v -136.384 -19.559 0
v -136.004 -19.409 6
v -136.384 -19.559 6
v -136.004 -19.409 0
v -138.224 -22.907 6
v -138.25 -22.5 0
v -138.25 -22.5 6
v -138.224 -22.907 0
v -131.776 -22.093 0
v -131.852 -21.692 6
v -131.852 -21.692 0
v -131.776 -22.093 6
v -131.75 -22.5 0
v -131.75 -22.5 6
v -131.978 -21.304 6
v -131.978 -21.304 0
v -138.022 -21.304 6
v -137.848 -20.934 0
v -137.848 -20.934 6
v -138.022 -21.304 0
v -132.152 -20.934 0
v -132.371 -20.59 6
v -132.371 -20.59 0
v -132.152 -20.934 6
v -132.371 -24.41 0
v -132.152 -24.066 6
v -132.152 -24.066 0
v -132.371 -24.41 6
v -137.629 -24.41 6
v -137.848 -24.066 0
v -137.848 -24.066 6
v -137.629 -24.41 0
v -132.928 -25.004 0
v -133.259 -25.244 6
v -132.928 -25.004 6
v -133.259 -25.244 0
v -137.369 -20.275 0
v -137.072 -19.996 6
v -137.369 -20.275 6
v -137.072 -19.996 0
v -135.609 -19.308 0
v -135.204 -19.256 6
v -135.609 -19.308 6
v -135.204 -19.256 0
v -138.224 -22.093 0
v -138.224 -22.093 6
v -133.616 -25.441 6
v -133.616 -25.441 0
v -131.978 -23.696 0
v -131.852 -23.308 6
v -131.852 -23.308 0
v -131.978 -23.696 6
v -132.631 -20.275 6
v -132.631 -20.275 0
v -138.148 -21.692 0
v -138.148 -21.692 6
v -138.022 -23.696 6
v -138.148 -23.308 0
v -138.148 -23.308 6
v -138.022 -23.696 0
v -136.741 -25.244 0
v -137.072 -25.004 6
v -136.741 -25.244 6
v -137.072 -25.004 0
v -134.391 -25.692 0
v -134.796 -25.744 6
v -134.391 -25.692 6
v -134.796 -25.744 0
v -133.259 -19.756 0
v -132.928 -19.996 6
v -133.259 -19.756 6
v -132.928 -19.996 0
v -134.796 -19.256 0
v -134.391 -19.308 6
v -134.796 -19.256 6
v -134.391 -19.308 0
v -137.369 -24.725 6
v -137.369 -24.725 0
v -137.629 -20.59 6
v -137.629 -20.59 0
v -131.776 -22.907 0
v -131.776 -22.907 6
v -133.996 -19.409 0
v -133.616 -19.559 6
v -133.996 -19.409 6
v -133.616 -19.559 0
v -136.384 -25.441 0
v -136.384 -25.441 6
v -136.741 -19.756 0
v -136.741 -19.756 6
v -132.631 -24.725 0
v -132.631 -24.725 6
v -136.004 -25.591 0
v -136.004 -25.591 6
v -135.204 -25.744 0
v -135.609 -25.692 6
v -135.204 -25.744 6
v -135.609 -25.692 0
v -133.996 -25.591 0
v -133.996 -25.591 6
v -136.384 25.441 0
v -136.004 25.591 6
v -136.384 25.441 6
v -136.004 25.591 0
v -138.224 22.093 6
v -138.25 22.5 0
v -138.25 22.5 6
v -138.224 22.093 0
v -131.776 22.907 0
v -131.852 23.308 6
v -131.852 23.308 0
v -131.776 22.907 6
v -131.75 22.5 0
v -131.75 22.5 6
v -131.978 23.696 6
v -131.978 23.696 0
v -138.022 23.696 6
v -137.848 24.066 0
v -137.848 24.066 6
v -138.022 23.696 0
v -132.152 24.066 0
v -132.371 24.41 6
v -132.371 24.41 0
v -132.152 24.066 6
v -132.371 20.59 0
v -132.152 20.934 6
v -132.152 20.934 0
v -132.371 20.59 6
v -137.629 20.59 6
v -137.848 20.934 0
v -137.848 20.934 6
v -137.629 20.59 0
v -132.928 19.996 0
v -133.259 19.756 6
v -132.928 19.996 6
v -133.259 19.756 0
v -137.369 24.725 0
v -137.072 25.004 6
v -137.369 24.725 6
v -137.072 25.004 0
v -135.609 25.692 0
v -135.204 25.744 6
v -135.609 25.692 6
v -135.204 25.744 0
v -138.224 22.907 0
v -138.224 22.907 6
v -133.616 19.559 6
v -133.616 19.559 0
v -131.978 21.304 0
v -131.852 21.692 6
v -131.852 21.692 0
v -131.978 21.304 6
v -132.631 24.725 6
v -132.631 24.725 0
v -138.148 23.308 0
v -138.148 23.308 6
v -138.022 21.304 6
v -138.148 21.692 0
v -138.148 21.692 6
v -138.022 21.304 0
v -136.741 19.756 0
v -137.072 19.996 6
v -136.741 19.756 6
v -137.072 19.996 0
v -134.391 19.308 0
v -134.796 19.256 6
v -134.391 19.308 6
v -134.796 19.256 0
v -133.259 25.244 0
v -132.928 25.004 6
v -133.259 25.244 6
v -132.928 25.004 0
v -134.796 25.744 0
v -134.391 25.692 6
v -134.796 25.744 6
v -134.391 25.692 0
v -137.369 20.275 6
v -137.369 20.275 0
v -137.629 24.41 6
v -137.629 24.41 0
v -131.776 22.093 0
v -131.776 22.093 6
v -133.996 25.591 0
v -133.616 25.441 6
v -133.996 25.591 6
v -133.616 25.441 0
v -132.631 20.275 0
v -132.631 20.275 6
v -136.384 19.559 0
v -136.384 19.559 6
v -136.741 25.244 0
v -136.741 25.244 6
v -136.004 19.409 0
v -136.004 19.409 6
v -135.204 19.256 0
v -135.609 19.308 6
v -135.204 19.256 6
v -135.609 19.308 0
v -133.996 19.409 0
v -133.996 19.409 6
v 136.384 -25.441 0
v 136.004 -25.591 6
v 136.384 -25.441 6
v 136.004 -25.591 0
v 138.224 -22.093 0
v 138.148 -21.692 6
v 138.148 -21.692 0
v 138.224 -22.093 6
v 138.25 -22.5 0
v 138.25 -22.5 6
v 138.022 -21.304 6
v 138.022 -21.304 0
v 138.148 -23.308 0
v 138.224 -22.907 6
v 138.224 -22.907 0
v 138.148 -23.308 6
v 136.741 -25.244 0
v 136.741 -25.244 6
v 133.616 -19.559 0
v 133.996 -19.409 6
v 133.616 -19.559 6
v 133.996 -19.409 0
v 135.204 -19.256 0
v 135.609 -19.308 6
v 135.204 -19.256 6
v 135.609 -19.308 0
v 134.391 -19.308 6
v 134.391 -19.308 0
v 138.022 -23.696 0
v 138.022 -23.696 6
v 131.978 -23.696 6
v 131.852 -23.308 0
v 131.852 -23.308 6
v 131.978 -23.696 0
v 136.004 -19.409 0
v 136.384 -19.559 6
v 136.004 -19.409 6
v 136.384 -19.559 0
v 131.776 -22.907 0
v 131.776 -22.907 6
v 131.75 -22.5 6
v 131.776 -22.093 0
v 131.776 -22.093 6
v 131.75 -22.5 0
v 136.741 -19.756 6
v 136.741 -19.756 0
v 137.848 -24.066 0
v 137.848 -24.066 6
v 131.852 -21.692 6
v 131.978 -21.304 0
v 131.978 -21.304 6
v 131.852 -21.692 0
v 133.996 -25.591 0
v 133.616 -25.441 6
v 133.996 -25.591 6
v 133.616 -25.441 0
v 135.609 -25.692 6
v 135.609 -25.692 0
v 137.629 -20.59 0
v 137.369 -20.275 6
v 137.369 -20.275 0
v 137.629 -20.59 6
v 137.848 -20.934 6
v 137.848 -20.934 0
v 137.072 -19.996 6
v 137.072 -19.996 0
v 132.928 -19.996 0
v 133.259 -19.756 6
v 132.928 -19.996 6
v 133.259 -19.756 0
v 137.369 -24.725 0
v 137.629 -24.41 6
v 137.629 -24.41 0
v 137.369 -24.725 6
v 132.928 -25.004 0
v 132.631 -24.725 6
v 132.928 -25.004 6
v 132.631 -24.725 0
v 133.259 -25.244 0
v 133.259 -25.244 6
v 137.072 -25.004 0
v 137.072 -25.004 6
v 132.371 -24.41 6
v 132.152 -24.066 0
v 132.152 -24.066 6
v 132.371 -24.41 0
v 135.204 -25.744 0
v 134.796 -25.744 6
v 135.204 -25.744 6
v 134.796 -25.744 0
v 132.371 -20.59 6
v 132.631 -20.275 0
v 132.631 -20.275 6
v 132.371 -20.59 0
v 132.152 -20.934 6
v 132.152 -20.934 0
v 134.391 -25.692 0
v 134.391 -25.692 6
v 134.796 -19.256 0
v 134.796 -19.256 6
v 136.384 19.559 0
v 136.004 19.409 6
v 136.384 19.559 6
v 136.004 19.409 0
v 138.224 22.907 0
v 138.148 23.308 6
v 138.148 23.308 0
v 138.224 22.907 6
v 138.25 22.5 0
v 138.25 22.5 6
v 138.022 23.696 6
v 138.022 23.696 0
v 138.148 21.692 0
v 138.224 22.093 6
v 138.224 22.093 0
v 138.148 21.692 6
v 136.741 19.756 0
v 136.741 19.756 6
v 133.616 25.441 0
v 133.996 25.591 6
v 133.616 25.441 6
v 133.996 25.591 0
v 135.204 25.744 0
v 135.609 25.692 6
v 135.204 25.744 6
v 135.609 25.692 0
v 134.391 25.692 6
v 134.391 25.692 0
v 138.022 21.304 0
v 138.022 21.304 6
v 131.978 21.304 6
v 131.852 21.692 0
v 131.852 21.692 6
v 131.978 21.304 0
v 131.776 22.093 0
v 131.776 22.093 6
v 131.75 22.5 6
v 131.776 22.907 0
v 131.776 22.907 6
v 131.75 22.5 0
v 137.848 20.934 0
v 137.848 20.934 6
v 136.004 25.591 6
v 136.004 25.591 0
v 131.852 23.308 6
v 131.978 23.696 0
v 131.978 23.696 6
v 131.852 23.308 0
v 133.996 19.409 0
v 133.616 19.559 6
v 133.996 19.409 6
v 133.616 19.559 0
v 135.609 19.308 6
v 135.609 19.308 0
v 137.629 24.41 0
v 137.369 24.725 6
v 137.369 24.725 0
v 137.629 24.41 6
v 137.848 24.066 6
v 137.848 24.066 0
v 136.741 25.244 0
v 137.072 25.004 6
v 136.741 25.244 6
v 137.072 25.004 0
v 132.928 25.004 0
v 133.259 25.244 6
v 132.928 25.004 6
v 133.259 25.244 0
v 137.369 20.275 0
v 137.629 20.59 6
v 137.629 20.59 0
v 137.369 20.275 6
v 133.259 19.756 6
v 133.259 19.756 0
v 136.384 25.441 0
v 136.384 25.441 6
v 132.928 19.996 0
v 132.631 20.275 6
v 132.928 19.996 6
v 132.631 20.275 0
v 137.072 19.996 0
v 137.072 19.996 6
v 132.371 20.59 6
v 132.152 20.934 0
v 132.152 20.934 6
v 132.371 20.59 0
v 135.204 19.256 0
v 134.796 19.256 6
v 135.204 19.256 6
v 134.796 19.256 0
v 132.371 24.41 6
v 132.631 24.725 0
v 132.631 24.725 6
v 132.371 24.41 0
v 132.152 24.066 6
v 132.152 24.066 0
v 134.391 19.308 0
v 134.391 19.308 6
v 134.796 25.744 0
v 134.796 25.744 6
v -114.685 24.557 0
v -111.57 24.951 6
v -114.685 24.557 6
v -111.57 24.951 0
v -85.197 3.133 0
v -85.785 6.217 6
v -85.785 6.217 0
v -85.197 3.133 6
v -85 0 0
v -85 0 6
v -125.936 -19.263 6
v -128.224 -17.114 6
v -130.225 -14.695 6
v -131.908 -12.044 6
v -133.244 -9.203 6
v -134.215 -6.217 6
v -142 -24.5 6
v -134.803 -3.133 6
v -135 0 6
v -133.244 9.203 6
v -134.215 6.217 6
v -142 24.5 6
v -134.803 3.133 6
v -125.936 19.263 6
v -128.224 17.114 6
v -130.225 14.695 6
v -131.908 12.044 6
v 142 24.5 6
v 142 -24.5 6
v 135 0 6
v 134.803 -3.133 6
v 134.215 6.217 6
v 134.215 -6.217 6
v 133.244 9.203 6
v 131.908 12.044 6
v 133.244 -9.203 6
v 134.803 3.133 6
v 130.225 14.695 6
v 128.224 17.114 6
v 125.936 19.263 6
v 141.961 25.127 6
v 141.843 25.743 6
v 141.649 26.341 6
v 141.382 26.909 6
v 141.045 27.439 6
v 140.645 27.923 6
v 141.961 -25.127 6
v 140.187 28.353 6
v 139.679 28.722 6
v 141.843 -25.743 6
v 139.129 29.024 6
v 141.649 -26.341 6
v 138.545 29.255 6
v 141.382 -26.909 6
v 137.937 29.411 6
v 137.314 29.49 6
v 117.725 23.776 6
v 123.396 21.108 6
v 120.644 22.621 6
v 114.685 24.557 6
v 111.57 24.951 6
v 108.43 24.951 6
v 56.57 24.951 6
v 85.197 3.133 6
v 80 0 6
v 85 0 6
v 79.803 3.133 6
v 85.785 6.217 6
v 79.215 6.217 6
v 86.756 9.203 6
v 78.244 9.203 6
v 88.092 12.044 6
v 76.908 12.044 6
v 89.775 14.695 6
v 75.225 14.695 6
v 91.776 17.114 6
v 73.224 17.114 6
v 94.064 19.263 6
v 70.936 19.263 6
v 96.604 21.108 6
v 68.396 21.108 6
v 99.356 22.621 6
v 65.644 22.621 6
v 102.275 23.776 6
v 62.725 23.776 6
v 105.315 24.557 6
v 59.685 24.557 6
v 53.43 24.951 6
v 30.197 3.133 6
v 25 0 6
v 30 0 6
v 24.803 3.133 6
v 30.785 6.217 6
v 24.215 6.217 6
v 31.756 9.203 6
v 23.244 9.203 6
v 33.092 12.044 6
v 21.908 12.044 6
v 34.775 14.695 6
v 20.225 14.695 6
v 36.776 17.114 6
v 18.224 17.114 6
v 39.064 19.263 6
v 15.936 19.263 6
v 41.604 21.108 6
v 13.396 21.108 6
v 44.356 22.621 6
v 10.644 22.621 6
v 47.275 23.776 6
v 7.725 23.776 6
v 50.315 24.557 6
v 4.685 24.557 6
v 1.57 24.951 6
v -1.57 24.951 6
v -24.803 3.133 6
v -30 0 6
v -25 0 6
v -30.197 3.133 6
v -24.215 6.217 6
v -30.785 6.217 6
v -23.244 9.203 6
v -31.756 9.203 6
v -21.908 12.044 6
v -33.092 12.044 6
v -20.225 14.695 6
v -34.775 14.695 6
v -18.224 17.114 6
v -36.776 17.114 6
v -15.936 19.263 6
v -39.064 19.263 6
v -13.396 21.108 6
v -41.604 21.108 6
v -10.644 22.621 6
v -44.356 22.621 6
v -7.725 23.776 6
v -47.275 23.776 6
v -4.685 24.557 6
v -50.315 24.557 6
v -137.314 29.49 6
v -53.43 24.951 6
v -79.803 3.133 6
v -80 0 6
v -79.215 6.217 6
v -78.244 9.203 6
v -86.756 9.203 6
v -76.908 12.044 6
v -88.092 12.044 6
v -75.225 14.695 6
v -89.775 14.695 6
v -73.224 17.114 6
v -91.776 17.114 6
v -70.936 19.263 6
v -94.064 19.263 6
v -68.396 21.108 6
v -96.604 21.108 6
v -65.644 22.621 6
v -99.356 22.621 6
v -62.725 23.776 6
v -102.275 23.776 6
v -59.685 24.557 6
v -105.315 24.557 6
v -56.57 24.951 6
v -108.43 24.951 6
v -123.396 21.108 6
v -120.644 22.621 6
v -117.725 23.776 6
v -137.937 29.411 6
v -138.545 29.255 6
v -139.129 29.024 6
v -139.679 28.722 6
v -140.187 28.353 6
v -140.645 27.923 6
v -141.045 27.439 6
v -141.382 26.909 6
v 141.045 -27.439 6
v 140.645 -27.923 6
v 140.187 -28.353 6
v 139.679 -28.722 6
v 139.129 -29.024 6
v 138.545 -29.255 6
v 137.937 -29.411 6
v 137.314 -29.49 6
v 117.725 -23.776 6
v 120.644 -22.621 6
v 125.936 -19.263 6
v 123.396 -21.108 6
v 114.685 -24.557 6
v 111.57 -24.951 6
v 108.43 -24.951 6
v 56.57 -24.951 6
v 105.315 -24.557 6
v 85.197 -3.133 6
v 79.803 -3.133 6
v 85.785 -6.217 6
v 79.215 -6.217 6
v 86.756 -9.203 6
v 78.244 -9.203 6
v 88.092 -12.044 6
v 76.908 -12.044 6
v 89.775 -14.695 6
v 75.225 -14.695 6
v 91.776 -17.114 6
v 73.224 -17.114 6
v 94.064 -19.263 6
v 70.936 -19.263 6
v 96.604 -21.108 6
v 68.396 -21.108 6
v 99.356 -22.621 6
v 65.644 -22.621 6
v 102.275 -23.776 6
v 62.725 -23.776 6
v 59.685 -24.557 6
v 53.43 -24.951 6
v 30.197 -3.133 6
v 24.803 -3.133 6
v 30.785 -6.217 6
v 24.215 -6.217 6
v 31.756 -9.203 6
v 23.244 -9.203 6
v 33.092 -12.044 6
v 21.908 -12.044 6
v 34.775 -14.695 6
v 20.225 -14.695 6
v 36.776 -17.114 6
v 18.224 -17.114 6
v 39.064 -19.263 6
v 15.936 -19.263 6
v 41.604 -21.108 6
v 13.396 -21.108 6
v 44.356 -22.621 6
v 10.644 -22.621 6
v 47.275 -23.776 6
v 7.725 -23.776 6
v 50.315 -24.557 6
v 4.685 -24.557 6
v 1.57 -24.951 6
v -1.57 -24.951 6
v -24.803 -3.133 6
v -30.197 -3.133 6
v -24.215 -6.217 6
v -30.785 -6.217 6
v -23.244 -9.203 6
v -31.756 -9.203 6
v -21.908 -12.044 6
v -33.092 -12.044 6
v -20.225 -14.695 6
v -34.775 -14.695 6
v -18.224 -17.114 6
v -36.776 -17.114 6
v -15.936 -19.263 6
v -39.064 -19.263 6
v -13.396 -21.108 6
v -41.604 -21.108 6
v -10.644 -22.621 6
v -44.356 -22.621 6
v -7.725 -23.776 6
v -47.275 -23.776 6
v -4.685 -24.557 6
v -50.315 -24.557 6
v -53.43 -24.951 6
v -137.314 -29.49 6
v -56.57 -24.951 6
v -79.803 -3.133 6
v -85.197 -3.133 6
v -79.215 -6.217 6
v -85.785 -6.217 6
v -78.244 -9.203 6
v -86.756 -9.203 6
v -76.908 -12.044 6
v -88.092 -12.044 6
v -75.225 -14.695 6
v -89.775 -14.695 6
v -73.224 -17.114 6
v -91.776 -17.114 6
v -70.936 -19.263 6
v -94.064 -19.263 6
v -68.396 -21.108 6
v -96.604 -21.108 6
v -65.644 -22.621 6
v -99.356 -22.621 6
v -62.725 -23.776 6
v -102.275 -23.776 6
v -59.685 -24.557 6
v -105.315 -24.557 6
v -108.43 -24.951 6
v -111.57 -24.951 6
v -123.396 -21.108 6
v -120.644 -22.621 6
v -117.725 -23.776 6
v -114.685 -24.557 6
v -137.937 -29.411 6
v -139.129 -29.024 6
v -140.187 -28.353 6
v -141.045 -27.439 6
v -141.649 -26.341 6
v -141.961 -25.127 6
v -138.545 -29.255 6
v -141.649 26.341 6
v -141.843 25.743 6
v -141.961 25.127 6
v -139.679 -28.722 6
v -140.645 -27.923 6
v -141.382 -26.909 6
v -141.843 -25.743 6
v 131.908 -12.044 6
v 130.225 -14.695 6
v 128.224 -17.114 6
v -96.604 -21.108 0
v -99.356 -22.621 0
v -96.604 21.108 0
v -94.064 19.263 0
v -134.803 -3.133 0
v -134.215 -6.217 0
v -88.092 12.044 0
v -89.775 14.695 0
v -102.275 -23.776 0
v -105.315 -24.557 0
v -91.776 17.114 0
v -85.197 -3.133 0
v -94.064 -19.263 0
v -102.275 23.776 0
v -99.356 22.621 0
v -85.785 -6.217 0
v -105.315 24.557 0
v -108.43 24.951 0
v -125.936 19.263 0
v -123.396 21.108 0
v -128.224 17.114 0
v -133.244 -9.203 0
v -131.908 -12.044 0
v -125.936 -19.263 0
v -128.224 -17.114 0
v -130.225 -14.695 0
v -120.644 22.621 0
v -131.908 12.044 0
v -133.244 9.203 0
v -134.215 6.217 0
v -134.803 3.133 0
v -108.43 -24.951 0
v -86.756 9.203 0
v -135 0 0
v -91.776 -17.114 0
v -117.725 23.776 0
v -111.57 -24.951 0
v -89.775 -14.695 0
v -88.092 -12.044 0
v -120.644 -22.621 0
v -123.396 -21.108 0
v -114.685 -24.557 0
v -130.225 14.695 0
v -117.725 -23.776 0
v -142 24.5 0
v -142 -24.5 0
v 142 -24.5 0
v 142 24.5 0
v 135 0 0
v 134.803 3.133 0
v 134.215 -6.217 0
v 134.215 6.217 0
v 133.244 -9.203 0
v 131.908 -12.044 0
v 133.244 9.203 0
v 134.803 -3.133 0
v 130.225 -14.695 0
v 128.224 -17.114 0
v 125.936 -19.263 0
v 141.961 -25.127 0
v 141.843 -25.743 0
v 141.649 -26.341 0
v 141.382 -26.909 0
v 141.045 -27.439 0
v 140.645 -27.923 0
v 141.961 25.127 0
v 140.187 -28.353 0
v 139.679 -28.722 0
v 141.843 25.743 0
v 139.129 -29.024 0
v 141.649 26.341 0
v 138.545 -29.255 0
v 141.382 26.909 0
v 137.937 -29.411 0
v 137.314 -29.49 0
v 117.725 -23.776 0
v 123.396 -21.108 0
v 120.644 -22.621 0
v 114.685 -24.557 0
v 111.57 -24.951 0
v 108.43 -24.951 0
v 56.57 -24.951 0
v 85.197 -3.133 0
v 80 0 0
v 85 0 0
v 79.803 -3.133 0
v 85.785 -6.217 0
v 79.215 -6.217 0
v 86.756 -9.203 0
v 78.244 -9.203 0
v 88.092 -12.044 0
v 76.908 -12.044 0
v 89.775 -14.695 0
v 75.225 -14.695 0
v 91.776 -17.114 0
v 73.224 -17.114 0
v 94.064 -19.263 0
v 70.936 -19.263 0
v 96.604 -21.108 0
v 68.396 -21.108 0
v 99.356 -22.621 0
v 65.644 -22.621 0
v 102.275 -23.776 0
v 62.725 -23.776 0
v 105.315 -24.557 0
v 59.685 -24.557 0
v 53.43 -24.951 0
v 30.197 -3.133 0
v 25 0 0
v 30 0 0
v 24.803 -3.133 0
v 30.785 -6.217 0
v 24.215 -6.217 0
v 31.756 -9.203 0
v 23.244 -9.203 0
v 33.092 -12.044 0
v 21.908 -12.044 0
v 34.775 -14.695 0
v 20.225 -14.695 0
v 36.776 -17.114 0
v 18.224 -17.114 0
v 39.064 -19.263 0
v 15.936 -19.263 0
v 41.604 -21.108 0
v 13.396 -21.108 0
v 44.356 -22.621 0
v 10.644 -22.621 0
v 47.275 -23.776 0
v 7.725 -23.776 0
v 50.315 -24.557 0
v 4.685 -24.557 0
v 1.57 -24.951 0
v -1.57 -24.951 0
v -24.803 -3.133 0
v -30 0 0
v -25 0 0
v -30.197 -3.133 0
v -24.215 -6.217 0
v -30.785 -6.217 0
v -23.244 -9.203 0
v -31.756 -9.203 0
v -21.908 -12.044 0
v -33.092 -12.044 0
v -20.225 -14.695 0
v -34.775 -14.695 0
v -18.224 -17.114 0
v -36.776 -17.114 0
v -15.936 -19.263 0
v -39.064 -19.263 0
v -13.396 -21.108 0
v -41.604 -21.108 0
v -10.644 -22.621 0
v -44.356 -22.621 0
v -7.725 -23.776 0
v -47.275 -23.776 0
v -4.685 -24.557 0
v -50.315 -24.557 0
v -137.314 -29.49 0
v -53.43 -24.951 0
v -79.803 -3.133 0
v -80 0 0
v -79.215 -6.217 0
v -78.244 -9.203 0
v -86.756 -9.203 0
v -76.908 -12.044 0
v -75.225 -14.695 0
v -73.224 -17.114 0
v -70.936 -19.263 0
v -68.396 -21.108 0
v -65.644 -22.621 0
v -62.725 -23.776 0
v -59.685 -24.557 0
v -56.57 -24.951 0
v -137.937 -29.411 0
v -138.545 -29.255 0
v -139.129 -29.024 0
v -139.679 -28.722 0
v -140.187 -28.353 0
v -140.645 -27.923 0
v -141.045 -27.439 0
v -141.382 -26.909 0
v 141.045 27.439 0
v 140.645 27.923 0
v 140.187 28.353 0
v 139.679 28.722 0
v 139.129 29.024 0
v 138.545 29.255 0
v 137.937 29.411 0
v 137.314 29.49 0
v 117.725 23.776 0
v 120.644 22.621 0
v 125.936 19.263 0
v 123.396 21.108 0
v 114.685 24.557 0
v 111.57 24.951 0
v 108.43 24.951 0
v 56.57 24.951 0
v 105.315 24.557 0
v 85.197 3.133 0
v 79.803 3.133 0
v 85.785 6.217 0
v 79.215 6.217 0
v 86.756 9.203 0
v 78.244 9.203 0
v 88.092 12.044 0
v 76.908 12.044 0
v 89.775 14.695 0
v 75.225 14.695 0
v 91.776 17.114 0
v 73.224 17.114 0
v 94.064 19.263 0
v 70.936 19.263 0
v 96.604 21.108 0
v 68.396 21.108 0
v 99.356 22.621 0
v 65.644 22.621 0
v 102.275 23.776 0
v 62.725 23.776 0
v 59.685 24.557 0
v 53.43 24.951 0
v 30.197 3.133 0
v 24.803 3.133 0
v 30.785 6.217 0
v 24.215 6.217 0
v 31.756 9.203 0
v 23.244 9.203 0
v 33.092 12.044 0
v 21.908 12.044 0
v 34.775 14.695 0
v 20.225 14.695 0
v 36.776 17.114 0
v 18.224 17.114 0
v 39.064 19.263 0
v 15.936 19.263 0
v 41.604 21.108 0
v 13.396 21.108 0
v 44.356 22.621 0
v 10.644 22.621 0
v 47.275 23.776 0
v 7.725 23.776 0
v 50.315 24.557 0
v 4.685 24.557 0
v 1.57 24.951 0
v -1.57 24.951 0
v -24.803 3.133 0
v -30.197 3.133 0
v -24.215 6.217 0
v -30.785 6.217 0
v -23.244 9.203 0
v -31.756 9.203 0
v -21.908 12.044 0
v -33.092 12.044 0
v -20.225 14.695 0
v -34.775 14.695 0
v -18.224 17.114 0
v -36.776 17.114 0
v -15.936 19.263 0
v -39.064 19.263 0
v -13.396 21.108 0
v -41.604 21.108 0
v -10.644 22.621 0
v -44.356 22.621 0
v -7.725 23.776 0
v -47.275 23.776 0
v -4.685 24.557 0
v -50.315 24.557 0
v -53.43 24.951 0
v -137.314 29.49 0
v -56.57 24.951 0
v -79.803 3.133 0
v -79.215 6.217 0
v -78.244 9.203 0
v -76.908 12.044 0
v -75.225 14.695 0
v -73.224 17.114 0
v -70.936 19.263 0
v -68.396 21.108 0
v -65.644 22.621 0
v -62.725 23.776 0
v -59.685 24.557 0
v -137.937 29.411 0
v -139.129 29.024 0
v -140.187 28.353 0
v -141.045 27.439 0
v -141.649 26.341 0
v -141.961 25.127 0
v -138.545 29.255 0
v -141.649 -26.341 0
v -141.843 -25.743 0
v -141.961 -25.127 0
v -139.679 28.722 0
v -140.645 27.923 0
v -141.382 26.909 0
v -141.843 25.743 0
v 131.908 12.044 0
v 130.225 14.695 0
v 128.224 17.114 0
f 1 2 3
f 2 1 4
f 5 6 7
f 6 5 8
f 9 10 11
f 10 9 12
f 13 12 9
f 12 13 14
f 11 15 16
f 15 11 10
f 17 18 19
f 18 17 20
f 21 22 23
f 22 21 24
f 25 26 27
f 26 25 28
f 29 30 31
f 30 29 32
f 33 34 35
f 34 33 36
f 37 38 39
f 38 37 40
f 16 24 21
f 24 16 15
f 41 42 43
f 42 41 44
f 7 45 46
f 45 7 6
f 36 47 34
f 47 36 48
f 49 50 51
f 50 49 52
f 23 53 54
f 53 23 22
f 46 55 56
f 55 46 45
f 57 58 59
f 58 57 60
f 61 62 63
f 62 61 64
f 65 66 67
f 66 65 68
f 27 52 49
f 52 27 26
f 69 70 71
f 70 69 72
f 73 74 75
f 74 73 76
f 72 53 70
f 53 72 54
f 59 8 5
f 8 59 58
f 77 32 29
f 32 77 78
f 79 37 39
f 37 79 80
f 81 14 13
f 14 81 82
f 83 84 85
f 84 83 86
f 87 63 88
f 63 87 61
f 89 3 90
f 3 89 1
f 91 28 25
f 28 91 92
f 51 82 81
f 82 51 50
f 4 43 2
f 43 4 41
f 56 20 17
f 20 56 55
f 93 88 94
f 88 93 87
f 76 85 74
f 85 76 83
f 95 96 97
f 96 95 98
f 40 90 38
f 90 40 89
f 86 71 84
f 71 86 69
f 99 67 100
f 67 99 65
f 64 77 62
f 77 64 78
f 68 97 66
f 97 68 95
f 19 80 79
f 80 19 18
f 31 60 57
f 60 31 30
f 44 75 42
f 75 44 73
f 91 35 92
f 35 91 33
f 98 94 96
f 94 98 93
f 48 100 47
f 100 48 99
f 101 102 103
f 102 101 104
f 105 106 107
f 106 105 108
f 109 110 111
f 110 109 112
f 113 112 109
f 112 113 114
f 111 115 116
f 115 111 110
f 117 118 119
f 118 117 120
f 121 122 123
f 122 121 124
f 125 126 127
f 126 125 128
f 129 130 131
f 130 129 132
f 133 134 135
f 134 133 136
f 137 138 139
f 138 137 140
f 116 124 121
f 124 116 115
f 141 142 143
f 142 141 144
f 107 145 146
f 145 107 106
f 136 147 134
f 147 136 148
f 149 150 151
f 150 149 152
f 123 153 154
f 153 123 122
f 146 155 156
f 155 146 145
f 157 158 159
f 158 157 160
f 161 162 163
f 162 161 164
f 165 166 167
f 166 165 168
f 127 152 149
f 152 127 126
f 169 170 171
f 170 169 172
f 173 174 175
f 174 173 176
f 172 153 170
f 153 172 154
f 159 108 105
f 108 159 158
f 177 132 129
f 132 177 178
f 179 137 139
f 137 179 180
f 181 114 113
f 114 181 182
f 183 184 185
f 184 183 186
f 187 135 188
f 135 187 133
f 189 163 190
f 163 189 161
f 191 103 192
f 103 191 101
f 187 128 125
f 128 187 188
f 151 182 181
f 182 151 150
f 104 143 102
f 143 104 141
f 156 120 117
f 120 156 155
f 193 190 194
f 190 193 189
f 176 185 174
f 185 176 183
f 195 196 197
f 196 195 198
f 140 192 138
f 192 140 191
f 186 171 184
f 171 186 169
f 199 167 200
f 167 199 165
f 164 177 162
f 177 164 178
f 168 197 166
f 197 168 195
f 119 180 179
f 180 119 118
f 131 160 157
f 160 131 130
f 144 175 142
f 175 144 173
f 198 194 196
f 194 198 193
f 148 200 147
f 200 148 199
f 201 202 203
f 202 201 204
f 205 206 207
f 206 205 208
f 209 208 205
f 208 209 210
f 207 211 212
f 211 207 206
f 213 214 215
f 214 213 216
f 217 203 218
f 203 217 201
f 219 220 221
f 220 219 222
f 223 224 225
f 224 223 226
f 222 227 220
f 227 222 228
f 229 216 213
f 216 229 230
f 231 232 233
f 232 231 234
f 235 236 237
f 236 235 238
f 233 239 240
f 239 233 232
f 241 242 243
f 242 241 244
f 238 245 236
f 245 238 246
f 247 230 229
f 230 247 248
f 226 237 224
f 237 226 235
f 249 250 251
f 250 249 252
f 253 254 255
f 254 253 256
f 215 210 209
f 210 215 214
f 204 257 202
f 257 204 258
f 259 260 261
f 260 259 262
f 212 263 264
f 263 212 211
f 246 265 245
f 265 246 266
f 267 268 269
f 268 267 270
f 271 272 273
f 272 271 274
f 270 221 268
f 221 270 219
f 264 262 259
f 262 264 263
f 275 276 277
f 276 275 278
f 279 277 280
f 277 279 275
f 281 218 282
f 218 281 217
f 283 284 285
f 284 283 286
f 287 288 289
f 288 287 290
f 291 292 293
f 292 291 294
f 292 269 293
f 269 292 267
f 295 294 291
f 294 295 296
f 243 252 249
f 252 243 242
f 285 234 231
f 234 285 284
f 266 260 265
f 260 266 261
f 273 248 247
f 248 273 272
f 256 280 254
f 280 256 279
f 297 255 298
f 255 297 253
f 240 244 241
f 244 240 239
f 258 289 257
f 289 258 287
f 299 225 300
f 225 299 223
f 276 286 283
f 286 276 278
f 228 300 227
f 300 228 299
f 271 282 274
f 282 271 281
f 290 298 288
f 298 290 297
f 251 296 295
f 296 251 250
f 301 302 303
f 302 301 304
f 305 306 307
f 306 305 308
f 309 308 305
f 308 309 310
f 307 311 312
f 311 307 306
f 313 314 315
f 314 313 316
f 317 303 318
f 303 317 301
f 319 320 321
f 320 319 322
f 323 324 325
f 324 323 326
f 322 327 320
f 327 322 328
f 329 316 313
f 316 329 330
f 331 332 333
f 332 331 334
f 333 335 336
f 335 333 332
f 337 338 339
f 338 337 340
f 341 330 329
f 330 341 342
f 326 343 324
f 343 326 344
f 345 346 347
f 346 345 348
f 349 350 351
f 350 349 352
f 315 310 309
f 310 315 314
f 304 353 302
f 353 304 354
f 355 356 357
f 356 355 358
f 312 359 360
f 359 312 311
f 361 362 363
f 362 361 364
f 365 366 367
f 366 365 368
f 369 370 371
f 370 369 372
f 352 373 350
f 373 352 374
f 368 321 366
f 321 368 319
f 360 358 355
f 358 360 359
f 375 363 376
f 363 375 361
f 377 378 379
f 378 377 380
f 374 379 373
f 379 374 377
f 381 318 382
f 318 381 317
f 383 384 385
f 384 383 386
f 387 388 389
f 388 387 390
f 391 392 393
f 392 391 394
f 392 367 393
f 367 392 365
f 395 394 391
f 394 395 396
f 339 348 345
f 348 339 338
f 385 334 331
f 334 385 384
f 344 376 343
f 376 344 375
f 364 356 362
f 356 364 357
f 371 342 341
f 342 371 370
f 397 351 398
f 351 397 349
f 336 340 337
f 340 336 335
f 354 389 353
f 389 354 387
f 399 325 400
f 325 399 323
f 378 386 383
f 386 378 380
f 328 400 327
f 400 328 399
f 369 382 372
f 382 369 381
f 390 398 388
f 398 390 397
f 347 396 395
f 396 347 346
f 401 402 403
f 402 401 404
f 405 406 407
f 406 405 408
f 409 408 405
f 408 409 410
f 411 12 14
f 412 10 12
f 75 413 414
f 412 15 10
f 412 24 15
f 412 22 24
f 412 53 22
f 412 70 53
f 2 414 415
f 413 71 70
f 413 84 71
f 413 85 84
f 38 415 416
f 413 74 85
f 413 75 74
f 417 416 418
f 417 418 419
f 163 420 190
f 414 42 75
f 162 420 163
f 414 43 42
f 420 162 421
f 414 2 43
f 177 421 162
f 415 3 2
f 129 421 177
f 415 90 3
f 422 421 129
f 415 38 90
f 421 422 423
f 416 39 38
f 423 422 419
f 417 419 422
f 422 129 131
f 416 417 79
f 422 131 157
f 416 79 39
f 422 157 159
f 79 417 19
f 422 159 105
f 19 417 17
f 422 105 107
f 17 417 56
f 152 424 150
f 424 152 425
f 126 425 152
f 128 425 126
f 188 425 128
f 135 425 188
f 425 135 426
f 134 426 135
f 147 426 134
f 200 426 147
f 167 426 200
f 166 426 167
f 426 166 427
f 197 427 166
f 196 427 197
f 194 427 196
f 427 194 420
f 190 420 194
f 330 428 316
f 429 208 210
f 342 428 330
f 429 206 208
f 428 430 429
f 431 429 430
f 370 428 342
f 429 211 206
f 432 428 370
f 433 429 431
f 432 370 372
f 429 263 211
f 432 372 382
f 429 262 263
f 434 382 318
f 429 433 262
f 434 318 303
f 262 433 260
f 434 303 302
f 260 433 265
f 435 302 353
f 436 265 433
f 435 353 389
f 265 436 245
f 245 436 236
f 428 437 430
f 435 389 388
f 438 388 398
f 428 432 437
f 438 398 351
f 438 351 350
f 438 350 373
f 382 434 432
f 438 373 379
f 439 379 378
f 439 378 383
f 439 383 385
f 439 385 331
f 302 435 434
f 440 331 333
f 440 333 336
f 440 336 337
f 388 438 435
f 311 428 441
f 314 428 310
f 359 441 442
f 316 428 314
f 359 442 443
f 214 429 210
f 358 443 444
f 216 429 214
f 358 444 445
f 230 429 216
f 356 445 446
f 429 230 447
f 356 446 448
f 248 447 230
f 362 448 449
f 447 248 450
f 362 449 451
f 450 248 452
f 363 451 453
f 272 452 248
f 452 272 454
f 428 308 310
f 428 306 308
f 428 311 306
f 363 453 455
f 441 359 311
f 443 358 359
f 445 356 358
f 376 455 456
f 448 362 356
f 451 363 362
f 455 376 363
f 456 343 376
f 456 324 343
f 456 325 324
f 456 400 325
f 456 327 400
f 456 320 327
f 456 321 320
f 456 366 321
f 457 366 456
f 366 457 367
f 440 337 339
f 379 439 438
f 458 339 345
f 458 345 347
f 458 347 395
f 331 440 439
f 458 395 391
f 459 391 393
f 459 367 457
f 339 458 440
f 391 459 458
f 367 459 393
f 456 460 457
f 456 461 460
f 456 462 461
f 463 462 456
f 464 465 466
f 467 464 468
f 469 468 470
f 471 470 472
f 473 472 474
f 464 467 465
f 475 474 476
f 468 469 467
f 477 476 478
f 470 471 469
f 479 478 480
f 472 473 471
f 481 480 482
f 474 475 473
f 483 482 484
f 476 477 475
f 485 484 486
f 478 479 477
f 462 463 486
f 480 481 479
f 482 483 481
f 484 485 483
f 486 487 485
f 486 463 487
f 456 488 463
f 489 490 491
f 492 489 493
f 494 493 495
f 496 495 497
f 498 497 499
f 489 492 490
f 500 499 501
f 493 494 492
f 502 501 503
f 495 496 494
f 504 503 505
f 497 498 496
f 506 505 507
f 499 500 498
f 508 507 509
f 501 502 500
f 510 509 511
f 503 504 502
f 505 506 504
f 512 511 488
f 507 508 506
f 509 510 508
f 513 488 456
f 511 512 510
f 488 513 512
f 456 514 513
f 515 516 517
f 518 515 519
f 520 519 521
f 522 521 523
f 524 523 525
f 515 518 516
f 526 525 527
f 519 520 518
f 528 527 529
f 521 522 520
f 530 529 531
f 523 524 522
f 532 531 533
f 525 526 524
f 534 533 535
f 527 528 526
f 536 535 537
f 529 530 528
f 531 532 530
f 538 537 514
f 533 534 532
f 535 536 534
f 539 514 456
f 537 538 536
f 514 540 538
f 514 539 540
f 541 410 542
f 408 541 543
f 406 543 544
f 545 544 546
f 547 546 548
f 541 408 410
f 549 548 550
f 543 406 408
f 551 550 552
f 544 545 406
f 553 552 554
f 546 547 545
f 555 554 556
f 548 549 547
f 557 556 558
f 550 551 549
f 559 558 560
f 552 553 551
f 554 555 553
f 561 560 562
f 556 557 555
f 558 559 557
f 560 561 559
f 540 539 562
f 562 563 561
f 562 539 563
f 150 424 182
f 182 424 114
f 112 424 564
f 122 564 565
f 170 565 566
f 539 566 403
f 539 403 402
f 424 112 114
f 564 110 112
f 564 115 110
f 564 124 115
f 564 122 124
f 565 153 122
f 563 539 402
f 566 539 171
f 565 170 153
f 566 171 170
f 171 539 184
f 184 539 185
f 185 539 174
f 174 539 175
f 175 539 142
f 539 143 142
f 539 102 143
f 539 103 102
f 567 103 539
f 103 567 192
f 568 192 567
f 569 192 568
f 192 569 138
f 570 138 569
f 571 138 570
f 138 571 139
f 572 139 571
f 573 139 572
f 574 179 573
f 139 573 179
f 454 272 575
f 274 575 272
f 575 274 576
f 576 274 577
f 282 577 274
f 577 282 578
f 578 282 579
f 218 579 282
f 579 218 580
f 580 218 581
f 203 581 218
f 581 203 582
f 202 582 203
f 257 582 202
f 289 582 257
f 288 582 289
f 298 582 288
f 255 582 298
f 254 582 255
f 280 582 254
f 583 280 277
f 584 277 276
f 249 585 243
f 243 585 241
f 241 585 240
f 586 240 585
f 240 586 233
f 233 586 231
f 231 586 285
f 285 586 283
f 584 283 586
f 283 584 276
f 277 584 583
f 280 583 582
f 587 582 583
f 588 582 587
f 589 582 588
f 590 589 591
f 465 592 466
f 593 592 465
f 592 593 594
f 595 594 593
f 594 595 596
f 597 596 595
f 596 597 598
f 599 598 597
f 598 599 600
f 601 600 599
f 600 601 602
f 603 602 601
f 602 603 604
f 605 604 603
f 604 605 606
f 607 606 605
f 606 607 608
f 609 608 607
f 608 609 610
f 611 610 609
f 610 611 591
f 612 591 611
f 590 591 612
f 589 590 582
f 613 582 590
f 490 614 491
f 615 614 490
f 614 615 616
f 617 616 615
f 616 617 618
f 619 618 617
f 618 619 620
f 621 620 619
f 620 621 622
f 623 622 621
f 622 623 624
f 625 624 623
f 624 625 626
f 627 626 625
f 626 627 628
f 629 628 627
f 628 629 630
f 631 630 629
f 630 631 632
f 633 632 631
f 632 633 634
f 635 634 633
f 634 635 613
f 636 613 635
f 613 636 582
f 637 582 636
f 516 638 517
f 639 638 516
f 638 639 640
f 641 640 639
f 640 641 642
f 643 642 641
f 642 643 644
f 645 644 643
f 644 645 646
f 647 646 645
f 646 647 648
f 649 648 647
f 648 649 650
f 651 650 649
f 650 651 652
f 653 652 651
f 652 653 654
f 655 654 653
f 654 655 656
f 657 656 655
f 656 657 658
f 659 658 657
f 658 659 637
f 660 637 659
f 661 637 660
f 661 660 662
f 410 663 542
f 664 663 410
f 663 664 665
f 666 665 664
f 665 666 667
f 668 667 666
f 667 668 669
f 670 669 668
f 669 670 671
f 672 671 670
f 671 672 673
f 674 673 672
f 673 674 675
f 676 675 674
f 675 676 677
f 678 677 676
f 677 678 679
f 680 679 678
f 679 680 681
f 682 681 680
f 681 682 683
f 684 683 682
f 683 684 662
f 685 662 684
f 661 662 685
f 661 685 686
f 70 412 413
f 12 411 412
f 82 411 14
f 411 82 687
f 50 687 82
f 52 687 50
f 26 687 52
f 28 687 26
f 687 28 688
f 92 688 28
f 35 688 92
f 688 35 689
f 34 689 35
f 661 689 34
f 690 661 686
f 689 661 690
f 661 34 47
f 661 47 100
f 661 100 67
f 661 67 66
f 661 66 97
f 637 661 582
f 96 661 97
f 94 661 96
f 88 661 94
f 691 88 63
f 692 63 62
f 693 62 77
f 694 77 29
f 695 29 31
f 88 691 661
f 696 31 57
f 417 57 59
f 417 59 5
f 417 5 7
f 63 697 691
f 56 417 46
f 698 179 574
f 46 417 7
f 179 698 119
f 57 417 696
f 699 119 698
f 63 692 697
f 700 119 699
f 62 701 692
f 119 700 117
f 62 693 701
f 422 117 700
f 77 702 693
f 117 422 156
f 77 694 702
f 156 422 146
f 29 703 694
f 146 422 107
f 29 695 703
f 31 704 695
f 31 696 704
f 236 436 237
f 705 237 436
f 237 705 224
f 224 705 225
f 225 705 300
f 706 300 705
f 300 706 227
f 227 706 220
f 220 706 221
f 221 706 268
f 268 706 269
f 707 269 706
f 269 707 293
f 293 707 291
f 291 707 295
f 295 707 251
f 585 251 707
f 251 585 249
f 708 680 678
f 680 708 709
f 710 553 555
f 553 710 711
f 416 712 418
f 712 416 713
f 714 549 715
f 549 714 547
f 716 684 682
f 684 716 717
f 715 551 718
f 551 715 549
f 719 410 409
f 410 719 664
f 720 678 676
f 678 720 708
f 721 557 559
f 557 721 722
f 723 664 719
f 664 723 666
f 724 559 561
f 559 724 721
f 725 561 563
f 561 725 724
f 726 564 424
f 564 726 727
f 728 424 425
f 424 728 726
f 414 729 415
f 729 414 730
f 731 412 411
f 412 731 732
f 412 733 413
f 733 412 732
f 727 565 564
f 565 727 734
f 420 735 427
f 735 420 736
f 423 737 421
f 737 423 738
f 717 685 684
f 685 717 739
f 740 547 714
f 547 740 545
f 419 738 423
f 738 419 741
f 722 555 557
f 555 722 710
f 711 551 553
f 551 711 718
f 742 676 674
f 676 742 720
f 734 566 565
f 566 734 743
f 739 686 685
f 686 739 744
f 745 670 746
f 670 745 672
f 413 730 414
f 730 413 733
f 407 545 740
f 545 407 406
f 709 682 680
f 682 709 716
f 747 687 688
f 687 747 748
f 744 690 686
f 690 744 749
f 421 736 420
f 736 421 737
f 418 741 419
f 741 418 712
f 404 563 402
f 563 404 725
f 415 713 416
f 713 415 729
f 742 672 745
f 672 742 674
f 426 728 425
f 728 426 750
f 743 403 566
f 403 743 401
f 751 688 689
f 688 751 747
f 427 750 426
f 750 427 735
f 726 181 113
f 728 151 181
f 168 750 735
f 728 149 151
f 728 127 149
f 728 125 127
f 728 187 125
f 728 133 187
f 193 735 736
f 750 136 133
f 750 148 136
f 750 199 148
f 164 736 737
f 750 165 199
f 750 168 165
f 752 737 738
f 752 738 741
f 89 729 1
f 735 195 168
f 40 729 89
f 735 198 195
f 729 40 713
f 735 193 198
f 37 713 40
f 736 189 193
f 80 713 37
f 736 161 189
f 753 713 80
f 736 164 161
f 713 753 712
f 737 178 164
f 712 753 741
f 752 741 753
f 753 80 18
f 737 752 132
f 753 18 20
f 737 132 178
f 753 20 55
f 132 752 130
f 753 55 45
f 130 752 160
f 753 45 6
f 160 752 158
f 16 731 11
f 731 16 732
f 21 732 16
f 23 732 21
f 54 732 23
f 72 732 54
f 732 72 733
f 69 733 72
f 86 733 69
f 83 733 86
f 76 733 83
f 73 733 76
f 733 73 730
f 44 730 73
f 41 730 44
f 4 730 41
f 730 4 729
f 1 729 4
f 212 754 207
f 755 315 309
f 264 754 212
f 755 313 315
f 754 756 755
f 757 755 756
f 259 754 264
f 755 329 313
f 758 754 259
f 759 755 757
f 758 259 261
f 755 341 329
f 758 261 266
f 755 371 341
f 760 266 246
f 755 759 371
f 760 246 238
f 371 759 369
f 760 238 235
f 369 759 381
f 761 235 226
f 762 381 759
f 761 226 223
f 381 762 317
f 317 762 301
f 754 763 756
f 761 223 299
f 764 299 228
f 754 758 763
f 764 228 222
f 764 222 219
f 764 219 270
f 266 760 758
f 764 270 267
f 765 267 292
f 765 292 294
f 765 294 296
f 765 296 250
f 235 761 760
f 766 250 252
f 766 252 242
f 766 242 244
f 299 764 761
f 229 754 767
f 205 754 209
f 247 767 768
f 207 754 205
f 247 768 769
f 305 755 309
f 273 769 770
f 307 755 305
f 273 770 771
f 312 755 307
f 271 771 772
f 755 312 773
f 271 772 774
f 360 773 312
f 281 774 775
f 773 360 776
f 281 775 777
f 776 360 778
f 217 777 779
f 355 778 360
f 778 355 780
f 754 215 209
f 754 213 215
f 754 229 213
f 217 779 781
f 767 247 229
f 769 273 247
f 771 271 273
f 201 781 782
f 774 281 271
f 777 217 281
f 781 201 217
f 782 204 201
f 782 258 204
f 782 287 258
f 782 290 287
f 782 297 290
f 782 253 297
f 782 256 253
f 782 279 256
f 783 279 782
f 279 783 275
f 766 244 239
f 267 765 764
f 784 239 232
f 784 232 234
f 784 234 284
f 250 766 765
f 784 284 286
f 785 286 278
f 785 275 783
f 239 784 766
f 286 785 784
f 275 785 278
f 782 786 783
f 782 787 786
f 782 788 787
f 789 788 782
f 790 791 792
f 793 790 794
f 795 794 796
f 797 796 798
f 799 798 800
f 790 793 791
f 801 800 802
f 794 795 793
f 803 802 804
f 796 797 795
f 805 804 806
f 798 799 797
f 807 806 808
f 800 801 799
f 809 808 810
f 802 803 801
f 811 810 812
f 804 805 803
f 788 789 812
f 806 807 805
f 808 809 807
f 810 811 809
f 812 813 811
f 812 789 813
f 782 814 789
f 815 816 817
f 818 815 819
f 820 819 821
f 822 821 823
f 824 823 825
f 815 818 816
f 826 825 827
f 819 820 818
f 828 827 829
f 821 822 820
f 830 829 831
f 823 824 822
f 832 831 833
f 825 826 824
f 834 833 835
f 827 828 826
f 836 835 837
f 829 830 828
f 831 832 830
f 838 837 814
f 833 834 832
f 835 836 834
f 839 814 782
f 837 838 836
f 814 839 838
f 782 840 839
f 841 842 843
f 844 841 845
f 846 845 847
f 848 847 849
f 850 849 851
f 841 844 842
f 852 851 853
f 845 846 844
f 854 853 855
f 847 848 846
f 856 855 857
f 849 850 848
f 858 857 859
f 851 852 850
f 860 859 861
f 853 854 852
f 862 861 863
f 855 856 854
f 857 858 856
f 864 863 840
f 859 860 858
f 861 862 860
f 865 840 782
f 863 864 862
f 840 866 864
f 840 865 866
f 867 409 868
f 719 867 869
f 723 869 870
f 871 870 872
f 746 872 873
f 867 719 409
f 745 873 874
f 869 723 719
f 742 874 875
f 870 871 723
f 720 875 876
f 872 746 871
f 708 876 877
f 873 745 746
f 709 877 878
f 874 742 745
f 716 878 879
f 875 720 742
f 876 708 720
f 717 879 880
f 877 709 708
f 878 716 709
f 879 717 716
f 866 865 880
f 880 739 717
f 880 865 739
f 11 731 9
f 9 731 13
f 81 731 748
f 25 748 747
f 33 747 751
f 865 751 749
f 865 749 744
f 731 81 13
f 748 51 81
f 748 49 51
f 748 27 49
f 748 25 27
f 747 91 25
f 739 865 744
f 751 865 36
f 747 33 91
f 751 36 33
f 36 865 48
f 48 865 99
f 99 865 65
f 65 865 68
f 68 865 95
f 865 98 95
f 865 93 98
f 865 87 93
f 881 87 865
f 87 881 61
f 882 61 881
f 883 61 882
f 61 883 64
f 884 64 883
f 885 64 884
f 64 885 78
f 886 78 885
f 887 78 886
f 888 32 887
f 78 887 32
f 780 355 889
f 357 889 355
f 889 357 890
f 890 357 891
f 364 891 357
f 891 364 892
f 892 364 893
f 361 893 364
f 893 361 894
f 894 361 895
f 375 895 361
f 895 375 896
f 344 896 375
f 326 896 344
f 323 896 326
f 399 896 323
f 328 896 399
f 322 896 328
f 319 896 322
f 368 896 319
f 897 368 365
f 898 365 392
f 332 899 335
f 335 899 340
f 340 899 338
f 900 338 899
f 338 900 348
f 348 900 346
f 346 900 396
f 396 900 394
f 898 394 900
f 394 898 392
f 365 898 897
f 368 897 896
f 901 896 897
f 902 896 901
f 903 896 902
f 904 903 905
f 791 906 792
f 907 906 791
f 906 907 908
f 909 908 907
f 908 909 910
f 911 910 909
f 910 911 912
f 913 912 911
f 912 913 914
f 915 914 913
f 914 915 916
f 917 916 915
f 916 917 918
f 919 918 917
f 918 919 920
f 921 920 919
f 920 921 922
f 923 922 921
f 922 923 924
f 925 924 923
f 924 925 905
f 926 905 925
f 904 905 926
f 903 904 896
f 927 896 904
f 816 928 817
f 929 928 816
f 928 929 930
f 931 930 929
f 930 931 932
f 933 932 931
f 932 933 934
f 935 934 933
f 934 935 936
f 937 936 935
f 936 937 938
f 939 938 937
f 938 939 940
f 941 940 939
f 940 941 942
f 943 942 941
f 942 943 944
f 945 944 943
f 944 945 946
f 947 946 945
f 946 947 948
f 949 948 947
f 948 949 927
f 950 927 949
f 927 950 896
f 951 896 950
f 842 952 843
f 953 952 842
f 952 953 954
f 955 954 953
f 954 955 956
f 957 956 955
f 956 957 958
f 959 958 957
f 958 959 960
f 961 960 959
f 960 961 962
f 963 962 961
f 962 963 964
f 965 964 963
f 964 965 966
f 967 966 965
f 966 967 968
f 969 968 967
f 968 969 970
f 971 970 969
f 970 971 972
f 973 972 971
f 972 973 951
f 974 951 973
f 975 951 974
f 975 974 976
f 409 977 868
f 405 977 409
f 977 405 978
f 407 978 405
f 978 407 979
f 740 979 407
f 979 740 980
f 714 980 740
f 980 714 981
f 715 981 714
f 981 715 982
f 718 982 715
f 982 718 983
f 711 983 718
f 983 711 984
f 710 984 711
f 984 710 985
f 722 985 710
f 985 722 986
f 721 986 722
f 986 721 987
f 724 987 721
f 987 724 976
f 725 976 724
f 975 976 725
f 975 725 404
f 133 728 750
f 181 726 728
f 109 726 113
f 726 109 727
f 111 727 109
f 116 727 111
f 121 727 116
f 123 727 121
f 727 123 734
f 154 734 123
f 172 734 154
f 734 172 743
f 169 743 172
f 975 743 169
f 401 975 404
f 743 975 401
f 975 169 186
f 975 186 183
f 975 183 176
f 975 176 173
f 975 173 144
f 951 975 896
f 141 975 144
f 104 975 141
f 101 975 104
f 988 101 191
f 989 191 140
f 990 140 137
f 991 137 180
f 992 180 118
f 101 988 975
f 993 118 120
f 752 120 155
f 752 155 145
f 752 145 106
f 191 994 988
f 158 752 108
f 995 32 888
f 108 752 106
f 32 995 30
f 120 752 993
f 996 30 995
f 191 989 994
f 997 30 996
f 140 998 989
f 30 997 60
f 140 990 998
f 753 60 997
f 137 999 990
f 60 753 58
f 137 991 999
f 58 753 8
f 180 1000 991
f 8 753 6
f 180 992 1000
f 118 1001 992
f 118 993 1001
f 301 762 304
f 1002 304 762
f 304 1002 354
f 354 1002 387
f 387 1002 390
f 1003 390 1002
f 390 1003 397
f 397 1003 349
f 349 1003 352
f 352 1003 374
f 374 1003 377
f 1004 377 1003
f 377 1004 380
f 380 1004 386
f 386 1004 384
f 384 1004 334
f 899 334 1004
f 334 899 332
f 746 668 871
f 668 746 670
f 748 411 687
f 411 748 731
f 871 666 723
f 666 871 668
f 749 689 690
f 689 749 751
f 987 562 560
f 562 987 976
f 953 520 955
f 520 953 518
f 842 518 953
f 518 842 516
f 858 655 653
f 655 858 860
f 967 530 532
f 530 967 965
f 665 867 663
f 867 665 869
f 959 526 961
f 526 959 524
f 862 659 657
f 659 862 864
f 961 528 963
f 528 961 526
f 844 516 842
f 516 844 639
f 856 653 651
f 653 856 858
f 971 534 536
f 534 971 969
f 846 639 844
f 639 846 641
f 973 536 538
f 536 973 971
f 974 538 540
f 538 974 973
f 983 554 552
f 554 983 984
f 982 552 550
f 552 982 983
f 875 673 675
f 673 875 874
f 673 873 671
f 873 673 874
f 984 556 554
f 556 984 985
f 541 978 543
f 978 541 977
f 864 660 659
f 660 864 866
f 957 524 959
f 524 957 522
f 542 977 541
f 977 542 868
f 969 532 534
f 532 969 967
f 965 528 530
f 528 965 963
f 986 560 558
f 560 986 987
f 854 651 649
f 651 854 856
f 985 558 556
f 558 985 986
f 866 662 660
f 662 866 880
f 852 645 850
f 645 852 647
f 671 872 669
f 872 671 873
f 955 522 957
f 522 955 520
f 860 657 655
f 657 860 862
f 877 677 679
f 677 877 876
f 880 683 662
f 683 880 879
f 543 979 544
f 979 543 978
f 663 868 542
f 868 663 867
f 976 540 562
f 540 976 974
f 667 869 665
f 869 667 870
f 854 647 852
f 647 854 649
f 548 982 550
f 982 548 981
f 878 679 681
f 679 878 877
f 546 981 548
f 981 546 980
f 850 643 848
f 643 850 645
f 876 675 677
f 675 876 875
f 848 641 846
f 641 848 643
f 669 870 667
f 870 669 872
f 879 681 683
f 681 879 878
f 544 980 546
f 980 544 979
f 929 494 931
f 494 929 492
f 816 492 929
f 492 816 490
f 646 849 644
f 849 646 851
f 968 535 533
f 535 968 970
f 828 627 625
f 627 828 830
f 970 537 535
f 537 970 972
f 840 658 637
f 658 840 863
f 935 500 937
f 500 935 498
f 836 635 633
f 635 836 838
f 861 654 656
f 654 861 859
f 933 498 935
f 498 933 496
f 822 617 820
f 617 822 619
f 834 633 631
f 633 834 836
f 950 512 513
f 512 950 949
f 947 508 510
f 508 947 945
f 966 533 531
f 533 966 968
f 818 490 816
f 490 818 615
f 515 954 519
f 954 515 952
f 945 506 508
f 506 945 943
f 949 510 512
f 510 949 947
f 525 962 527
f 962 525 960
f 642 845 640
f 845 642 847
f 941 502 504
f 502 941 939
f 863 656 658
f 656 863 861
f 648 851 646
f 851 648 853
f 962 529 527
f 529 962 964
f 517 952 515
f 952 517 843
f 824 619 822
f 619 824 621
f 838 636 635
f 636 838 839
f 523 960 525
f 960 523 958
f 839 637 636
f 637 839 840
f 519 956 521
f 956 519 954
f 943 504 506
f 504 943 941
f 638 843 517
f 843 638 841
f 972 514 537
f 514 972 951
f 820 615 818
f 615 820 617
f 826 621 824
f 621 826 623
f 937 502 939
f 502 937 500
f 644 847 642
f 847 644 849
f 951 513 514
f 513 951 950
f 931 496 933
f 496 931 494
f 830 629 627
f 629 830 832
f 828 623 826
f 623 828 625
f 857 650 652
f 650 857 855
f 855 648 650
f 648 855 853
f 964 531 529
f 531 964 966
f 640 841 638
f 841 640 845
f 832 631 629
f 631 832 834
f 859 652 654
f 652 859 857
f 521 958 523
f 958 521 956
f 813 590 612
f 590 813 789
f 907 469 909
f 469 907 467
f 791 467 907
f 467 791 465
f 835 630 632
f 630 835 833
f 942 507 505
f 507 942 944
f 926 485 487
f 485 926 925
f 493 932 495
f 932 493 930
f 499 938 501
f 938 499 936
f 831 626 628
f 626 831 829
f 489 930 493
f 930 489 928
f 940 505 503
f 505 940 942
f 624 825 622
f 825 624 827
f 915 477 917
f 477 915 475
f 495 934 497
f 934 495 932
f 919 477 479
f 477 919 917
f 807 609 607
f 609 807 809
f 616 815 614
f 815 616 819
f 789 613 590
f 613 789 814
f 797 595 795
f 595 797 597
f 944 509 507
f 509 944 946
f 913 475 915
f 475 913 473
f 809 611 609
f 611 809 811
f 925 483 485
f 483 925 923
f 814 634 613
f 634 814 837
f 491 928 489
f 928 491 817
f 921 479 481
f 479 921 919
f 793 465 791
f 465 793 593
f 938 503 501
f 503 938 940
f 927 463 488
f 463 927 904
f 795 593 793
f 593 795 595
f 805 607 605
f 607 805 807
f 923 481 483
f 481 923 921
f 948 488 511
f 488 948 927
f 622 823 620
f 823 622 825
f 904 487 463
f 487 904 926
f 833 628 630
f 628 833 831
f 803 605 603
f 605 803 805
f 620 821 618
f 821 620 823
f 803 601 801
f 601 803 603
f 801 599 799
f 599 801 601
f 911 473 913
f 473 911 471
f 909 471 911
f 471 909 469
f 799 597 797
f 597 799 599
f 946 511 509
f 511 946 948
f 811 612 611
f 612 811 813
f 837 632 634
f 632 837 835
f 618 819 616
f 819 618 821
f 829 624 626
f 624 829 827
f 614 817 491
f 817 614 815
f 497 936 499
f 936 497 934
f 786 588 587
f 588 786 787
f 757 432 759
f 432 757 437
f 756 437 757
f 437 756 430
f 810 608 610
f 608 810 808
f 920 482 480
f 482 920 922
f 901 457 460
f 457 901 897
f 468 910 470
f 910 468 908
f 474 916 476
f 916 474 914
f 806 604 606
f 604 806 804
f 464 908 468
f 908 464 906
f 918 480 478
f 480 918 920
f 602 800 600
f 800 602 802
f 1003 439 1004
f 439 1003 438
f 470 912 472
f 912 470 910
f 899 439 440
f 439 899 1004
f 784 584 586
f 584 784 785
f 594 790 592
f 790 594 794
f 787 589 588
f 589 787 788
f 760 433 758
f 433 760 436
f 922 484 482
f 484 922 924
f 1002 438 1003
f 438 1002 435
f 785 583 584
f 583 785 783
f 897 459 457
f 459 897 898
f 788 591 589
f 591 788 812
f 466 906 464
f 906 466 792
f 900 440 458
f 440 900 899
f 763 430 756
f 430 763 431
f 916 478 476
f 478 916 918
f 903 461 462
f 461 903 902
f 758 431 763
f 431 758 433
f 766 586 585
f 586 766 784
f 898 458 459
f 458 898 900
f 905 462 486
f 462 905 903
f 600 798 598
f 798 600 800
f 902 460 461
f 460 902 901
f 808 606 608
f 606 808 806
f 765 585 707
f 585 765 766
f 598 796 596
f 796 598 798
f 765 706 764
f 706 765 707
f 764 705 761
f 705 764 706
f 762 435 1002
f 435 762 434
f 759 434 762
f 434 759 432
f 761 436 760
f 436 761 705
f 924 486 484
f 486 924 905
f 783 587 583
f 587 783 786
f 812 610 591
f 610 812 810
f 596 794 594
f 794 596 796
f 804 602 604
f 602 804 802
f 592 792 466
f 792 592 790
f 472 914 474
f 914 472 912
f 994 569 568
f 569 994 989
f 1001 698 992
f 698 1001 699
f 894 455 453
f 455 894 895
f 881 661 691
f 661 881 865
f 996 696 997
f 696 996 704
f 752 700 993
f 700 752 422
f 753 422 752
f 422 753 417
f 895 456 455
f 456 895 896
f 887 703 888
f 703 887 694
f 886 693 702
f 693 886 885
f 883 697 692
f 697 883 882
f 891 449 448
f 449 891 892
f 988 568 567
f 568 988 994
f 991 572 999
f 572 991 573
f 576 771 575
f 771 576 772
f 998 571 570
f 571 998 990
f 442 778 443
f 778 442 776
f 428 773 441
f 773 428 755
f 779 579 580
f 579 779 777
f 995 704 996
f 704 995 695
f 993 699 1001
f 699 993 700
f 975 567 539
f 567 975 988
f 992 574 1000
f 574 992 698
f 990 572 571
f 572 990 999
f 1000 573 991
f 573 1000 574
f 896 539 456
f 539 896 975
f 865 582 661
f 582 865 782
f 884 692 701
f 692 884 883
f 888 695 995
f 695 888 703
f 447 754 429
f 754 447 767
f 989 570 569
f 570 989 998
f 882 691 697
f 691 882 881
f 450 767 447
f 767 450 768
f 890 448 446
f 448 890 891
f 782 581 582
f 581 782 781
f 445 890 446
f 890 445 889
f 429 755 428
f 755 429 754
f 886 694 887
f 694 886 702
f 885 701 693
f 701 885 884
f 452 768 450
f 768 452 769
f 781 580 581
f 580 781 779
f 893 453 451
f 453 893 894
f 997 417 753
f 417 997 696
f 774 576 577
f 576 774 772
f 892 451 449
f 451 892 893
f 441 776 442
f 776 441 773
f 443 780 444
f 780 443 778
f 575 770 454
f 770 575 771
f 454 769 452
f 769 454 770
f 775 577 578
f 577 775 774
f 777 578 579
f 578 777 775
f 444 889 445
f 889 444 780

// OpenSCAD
$fn = 50;


difference() {
	union() {
		hull() {
			translate(v = [-137.0000000000, 24.5000000000, 0]) {
				cylinder(h = 6, r = 5);
			}
			translate(v = [137.0000000000, 24.5000000000, 0]) {
				cylinder(h = 6, r = 5);
			}
			translate(v = [-137.0000000000, -24.5000000000, 0]) {
				cylinder(h = 6, r = 5);
			}
			translate(v = [137.0000000000, -24.5000000000, 0]) {
				cylinder(h = 6, r = 5);
			}
		}
	}
	union() {
		#translate(v = [-135.0000000000, -22.5000000000, -100.0000000000]) {
			cylinder(h = 200, r = 3.2500000000);
		}
		#translate(v = [-135.0000000000, 22.5000000000, -100.0000000000]) {
			cylinder(h = 200, r = 3.2500000000);
		}
		#translate(v = [135.0000000000, -22.5000000000, -100.0000000000]) {
			cylinder(h = 200, r = 3.2500000000);
		}
		#translate(v = [135.0000000000, 22.5000000000, -100.0000000000]) {
			cylinder(h = 200, r = 3.2500000000);
		}
		#translate(v = [-110.0000000000, 0, 0]) {
			cylinder(h = 6, r = 25.0000000000);
		}
		#translate(v = [-55.0000000000, 0, 0]) {
			cylinder(h = 6, r = 25.0000000000);
		}
		#cylinder(h = 6, r = 25.0000000000);
		#translate(v = [55.0000000000, 0, 0]) {
			cylinder(h = 6, r = 25.0000000000);
		}
		#translate(v = [110.0000000000, 0, 0]) {
			cylinder(h = 6, r = 25.0000000000);
		}
	}
}
